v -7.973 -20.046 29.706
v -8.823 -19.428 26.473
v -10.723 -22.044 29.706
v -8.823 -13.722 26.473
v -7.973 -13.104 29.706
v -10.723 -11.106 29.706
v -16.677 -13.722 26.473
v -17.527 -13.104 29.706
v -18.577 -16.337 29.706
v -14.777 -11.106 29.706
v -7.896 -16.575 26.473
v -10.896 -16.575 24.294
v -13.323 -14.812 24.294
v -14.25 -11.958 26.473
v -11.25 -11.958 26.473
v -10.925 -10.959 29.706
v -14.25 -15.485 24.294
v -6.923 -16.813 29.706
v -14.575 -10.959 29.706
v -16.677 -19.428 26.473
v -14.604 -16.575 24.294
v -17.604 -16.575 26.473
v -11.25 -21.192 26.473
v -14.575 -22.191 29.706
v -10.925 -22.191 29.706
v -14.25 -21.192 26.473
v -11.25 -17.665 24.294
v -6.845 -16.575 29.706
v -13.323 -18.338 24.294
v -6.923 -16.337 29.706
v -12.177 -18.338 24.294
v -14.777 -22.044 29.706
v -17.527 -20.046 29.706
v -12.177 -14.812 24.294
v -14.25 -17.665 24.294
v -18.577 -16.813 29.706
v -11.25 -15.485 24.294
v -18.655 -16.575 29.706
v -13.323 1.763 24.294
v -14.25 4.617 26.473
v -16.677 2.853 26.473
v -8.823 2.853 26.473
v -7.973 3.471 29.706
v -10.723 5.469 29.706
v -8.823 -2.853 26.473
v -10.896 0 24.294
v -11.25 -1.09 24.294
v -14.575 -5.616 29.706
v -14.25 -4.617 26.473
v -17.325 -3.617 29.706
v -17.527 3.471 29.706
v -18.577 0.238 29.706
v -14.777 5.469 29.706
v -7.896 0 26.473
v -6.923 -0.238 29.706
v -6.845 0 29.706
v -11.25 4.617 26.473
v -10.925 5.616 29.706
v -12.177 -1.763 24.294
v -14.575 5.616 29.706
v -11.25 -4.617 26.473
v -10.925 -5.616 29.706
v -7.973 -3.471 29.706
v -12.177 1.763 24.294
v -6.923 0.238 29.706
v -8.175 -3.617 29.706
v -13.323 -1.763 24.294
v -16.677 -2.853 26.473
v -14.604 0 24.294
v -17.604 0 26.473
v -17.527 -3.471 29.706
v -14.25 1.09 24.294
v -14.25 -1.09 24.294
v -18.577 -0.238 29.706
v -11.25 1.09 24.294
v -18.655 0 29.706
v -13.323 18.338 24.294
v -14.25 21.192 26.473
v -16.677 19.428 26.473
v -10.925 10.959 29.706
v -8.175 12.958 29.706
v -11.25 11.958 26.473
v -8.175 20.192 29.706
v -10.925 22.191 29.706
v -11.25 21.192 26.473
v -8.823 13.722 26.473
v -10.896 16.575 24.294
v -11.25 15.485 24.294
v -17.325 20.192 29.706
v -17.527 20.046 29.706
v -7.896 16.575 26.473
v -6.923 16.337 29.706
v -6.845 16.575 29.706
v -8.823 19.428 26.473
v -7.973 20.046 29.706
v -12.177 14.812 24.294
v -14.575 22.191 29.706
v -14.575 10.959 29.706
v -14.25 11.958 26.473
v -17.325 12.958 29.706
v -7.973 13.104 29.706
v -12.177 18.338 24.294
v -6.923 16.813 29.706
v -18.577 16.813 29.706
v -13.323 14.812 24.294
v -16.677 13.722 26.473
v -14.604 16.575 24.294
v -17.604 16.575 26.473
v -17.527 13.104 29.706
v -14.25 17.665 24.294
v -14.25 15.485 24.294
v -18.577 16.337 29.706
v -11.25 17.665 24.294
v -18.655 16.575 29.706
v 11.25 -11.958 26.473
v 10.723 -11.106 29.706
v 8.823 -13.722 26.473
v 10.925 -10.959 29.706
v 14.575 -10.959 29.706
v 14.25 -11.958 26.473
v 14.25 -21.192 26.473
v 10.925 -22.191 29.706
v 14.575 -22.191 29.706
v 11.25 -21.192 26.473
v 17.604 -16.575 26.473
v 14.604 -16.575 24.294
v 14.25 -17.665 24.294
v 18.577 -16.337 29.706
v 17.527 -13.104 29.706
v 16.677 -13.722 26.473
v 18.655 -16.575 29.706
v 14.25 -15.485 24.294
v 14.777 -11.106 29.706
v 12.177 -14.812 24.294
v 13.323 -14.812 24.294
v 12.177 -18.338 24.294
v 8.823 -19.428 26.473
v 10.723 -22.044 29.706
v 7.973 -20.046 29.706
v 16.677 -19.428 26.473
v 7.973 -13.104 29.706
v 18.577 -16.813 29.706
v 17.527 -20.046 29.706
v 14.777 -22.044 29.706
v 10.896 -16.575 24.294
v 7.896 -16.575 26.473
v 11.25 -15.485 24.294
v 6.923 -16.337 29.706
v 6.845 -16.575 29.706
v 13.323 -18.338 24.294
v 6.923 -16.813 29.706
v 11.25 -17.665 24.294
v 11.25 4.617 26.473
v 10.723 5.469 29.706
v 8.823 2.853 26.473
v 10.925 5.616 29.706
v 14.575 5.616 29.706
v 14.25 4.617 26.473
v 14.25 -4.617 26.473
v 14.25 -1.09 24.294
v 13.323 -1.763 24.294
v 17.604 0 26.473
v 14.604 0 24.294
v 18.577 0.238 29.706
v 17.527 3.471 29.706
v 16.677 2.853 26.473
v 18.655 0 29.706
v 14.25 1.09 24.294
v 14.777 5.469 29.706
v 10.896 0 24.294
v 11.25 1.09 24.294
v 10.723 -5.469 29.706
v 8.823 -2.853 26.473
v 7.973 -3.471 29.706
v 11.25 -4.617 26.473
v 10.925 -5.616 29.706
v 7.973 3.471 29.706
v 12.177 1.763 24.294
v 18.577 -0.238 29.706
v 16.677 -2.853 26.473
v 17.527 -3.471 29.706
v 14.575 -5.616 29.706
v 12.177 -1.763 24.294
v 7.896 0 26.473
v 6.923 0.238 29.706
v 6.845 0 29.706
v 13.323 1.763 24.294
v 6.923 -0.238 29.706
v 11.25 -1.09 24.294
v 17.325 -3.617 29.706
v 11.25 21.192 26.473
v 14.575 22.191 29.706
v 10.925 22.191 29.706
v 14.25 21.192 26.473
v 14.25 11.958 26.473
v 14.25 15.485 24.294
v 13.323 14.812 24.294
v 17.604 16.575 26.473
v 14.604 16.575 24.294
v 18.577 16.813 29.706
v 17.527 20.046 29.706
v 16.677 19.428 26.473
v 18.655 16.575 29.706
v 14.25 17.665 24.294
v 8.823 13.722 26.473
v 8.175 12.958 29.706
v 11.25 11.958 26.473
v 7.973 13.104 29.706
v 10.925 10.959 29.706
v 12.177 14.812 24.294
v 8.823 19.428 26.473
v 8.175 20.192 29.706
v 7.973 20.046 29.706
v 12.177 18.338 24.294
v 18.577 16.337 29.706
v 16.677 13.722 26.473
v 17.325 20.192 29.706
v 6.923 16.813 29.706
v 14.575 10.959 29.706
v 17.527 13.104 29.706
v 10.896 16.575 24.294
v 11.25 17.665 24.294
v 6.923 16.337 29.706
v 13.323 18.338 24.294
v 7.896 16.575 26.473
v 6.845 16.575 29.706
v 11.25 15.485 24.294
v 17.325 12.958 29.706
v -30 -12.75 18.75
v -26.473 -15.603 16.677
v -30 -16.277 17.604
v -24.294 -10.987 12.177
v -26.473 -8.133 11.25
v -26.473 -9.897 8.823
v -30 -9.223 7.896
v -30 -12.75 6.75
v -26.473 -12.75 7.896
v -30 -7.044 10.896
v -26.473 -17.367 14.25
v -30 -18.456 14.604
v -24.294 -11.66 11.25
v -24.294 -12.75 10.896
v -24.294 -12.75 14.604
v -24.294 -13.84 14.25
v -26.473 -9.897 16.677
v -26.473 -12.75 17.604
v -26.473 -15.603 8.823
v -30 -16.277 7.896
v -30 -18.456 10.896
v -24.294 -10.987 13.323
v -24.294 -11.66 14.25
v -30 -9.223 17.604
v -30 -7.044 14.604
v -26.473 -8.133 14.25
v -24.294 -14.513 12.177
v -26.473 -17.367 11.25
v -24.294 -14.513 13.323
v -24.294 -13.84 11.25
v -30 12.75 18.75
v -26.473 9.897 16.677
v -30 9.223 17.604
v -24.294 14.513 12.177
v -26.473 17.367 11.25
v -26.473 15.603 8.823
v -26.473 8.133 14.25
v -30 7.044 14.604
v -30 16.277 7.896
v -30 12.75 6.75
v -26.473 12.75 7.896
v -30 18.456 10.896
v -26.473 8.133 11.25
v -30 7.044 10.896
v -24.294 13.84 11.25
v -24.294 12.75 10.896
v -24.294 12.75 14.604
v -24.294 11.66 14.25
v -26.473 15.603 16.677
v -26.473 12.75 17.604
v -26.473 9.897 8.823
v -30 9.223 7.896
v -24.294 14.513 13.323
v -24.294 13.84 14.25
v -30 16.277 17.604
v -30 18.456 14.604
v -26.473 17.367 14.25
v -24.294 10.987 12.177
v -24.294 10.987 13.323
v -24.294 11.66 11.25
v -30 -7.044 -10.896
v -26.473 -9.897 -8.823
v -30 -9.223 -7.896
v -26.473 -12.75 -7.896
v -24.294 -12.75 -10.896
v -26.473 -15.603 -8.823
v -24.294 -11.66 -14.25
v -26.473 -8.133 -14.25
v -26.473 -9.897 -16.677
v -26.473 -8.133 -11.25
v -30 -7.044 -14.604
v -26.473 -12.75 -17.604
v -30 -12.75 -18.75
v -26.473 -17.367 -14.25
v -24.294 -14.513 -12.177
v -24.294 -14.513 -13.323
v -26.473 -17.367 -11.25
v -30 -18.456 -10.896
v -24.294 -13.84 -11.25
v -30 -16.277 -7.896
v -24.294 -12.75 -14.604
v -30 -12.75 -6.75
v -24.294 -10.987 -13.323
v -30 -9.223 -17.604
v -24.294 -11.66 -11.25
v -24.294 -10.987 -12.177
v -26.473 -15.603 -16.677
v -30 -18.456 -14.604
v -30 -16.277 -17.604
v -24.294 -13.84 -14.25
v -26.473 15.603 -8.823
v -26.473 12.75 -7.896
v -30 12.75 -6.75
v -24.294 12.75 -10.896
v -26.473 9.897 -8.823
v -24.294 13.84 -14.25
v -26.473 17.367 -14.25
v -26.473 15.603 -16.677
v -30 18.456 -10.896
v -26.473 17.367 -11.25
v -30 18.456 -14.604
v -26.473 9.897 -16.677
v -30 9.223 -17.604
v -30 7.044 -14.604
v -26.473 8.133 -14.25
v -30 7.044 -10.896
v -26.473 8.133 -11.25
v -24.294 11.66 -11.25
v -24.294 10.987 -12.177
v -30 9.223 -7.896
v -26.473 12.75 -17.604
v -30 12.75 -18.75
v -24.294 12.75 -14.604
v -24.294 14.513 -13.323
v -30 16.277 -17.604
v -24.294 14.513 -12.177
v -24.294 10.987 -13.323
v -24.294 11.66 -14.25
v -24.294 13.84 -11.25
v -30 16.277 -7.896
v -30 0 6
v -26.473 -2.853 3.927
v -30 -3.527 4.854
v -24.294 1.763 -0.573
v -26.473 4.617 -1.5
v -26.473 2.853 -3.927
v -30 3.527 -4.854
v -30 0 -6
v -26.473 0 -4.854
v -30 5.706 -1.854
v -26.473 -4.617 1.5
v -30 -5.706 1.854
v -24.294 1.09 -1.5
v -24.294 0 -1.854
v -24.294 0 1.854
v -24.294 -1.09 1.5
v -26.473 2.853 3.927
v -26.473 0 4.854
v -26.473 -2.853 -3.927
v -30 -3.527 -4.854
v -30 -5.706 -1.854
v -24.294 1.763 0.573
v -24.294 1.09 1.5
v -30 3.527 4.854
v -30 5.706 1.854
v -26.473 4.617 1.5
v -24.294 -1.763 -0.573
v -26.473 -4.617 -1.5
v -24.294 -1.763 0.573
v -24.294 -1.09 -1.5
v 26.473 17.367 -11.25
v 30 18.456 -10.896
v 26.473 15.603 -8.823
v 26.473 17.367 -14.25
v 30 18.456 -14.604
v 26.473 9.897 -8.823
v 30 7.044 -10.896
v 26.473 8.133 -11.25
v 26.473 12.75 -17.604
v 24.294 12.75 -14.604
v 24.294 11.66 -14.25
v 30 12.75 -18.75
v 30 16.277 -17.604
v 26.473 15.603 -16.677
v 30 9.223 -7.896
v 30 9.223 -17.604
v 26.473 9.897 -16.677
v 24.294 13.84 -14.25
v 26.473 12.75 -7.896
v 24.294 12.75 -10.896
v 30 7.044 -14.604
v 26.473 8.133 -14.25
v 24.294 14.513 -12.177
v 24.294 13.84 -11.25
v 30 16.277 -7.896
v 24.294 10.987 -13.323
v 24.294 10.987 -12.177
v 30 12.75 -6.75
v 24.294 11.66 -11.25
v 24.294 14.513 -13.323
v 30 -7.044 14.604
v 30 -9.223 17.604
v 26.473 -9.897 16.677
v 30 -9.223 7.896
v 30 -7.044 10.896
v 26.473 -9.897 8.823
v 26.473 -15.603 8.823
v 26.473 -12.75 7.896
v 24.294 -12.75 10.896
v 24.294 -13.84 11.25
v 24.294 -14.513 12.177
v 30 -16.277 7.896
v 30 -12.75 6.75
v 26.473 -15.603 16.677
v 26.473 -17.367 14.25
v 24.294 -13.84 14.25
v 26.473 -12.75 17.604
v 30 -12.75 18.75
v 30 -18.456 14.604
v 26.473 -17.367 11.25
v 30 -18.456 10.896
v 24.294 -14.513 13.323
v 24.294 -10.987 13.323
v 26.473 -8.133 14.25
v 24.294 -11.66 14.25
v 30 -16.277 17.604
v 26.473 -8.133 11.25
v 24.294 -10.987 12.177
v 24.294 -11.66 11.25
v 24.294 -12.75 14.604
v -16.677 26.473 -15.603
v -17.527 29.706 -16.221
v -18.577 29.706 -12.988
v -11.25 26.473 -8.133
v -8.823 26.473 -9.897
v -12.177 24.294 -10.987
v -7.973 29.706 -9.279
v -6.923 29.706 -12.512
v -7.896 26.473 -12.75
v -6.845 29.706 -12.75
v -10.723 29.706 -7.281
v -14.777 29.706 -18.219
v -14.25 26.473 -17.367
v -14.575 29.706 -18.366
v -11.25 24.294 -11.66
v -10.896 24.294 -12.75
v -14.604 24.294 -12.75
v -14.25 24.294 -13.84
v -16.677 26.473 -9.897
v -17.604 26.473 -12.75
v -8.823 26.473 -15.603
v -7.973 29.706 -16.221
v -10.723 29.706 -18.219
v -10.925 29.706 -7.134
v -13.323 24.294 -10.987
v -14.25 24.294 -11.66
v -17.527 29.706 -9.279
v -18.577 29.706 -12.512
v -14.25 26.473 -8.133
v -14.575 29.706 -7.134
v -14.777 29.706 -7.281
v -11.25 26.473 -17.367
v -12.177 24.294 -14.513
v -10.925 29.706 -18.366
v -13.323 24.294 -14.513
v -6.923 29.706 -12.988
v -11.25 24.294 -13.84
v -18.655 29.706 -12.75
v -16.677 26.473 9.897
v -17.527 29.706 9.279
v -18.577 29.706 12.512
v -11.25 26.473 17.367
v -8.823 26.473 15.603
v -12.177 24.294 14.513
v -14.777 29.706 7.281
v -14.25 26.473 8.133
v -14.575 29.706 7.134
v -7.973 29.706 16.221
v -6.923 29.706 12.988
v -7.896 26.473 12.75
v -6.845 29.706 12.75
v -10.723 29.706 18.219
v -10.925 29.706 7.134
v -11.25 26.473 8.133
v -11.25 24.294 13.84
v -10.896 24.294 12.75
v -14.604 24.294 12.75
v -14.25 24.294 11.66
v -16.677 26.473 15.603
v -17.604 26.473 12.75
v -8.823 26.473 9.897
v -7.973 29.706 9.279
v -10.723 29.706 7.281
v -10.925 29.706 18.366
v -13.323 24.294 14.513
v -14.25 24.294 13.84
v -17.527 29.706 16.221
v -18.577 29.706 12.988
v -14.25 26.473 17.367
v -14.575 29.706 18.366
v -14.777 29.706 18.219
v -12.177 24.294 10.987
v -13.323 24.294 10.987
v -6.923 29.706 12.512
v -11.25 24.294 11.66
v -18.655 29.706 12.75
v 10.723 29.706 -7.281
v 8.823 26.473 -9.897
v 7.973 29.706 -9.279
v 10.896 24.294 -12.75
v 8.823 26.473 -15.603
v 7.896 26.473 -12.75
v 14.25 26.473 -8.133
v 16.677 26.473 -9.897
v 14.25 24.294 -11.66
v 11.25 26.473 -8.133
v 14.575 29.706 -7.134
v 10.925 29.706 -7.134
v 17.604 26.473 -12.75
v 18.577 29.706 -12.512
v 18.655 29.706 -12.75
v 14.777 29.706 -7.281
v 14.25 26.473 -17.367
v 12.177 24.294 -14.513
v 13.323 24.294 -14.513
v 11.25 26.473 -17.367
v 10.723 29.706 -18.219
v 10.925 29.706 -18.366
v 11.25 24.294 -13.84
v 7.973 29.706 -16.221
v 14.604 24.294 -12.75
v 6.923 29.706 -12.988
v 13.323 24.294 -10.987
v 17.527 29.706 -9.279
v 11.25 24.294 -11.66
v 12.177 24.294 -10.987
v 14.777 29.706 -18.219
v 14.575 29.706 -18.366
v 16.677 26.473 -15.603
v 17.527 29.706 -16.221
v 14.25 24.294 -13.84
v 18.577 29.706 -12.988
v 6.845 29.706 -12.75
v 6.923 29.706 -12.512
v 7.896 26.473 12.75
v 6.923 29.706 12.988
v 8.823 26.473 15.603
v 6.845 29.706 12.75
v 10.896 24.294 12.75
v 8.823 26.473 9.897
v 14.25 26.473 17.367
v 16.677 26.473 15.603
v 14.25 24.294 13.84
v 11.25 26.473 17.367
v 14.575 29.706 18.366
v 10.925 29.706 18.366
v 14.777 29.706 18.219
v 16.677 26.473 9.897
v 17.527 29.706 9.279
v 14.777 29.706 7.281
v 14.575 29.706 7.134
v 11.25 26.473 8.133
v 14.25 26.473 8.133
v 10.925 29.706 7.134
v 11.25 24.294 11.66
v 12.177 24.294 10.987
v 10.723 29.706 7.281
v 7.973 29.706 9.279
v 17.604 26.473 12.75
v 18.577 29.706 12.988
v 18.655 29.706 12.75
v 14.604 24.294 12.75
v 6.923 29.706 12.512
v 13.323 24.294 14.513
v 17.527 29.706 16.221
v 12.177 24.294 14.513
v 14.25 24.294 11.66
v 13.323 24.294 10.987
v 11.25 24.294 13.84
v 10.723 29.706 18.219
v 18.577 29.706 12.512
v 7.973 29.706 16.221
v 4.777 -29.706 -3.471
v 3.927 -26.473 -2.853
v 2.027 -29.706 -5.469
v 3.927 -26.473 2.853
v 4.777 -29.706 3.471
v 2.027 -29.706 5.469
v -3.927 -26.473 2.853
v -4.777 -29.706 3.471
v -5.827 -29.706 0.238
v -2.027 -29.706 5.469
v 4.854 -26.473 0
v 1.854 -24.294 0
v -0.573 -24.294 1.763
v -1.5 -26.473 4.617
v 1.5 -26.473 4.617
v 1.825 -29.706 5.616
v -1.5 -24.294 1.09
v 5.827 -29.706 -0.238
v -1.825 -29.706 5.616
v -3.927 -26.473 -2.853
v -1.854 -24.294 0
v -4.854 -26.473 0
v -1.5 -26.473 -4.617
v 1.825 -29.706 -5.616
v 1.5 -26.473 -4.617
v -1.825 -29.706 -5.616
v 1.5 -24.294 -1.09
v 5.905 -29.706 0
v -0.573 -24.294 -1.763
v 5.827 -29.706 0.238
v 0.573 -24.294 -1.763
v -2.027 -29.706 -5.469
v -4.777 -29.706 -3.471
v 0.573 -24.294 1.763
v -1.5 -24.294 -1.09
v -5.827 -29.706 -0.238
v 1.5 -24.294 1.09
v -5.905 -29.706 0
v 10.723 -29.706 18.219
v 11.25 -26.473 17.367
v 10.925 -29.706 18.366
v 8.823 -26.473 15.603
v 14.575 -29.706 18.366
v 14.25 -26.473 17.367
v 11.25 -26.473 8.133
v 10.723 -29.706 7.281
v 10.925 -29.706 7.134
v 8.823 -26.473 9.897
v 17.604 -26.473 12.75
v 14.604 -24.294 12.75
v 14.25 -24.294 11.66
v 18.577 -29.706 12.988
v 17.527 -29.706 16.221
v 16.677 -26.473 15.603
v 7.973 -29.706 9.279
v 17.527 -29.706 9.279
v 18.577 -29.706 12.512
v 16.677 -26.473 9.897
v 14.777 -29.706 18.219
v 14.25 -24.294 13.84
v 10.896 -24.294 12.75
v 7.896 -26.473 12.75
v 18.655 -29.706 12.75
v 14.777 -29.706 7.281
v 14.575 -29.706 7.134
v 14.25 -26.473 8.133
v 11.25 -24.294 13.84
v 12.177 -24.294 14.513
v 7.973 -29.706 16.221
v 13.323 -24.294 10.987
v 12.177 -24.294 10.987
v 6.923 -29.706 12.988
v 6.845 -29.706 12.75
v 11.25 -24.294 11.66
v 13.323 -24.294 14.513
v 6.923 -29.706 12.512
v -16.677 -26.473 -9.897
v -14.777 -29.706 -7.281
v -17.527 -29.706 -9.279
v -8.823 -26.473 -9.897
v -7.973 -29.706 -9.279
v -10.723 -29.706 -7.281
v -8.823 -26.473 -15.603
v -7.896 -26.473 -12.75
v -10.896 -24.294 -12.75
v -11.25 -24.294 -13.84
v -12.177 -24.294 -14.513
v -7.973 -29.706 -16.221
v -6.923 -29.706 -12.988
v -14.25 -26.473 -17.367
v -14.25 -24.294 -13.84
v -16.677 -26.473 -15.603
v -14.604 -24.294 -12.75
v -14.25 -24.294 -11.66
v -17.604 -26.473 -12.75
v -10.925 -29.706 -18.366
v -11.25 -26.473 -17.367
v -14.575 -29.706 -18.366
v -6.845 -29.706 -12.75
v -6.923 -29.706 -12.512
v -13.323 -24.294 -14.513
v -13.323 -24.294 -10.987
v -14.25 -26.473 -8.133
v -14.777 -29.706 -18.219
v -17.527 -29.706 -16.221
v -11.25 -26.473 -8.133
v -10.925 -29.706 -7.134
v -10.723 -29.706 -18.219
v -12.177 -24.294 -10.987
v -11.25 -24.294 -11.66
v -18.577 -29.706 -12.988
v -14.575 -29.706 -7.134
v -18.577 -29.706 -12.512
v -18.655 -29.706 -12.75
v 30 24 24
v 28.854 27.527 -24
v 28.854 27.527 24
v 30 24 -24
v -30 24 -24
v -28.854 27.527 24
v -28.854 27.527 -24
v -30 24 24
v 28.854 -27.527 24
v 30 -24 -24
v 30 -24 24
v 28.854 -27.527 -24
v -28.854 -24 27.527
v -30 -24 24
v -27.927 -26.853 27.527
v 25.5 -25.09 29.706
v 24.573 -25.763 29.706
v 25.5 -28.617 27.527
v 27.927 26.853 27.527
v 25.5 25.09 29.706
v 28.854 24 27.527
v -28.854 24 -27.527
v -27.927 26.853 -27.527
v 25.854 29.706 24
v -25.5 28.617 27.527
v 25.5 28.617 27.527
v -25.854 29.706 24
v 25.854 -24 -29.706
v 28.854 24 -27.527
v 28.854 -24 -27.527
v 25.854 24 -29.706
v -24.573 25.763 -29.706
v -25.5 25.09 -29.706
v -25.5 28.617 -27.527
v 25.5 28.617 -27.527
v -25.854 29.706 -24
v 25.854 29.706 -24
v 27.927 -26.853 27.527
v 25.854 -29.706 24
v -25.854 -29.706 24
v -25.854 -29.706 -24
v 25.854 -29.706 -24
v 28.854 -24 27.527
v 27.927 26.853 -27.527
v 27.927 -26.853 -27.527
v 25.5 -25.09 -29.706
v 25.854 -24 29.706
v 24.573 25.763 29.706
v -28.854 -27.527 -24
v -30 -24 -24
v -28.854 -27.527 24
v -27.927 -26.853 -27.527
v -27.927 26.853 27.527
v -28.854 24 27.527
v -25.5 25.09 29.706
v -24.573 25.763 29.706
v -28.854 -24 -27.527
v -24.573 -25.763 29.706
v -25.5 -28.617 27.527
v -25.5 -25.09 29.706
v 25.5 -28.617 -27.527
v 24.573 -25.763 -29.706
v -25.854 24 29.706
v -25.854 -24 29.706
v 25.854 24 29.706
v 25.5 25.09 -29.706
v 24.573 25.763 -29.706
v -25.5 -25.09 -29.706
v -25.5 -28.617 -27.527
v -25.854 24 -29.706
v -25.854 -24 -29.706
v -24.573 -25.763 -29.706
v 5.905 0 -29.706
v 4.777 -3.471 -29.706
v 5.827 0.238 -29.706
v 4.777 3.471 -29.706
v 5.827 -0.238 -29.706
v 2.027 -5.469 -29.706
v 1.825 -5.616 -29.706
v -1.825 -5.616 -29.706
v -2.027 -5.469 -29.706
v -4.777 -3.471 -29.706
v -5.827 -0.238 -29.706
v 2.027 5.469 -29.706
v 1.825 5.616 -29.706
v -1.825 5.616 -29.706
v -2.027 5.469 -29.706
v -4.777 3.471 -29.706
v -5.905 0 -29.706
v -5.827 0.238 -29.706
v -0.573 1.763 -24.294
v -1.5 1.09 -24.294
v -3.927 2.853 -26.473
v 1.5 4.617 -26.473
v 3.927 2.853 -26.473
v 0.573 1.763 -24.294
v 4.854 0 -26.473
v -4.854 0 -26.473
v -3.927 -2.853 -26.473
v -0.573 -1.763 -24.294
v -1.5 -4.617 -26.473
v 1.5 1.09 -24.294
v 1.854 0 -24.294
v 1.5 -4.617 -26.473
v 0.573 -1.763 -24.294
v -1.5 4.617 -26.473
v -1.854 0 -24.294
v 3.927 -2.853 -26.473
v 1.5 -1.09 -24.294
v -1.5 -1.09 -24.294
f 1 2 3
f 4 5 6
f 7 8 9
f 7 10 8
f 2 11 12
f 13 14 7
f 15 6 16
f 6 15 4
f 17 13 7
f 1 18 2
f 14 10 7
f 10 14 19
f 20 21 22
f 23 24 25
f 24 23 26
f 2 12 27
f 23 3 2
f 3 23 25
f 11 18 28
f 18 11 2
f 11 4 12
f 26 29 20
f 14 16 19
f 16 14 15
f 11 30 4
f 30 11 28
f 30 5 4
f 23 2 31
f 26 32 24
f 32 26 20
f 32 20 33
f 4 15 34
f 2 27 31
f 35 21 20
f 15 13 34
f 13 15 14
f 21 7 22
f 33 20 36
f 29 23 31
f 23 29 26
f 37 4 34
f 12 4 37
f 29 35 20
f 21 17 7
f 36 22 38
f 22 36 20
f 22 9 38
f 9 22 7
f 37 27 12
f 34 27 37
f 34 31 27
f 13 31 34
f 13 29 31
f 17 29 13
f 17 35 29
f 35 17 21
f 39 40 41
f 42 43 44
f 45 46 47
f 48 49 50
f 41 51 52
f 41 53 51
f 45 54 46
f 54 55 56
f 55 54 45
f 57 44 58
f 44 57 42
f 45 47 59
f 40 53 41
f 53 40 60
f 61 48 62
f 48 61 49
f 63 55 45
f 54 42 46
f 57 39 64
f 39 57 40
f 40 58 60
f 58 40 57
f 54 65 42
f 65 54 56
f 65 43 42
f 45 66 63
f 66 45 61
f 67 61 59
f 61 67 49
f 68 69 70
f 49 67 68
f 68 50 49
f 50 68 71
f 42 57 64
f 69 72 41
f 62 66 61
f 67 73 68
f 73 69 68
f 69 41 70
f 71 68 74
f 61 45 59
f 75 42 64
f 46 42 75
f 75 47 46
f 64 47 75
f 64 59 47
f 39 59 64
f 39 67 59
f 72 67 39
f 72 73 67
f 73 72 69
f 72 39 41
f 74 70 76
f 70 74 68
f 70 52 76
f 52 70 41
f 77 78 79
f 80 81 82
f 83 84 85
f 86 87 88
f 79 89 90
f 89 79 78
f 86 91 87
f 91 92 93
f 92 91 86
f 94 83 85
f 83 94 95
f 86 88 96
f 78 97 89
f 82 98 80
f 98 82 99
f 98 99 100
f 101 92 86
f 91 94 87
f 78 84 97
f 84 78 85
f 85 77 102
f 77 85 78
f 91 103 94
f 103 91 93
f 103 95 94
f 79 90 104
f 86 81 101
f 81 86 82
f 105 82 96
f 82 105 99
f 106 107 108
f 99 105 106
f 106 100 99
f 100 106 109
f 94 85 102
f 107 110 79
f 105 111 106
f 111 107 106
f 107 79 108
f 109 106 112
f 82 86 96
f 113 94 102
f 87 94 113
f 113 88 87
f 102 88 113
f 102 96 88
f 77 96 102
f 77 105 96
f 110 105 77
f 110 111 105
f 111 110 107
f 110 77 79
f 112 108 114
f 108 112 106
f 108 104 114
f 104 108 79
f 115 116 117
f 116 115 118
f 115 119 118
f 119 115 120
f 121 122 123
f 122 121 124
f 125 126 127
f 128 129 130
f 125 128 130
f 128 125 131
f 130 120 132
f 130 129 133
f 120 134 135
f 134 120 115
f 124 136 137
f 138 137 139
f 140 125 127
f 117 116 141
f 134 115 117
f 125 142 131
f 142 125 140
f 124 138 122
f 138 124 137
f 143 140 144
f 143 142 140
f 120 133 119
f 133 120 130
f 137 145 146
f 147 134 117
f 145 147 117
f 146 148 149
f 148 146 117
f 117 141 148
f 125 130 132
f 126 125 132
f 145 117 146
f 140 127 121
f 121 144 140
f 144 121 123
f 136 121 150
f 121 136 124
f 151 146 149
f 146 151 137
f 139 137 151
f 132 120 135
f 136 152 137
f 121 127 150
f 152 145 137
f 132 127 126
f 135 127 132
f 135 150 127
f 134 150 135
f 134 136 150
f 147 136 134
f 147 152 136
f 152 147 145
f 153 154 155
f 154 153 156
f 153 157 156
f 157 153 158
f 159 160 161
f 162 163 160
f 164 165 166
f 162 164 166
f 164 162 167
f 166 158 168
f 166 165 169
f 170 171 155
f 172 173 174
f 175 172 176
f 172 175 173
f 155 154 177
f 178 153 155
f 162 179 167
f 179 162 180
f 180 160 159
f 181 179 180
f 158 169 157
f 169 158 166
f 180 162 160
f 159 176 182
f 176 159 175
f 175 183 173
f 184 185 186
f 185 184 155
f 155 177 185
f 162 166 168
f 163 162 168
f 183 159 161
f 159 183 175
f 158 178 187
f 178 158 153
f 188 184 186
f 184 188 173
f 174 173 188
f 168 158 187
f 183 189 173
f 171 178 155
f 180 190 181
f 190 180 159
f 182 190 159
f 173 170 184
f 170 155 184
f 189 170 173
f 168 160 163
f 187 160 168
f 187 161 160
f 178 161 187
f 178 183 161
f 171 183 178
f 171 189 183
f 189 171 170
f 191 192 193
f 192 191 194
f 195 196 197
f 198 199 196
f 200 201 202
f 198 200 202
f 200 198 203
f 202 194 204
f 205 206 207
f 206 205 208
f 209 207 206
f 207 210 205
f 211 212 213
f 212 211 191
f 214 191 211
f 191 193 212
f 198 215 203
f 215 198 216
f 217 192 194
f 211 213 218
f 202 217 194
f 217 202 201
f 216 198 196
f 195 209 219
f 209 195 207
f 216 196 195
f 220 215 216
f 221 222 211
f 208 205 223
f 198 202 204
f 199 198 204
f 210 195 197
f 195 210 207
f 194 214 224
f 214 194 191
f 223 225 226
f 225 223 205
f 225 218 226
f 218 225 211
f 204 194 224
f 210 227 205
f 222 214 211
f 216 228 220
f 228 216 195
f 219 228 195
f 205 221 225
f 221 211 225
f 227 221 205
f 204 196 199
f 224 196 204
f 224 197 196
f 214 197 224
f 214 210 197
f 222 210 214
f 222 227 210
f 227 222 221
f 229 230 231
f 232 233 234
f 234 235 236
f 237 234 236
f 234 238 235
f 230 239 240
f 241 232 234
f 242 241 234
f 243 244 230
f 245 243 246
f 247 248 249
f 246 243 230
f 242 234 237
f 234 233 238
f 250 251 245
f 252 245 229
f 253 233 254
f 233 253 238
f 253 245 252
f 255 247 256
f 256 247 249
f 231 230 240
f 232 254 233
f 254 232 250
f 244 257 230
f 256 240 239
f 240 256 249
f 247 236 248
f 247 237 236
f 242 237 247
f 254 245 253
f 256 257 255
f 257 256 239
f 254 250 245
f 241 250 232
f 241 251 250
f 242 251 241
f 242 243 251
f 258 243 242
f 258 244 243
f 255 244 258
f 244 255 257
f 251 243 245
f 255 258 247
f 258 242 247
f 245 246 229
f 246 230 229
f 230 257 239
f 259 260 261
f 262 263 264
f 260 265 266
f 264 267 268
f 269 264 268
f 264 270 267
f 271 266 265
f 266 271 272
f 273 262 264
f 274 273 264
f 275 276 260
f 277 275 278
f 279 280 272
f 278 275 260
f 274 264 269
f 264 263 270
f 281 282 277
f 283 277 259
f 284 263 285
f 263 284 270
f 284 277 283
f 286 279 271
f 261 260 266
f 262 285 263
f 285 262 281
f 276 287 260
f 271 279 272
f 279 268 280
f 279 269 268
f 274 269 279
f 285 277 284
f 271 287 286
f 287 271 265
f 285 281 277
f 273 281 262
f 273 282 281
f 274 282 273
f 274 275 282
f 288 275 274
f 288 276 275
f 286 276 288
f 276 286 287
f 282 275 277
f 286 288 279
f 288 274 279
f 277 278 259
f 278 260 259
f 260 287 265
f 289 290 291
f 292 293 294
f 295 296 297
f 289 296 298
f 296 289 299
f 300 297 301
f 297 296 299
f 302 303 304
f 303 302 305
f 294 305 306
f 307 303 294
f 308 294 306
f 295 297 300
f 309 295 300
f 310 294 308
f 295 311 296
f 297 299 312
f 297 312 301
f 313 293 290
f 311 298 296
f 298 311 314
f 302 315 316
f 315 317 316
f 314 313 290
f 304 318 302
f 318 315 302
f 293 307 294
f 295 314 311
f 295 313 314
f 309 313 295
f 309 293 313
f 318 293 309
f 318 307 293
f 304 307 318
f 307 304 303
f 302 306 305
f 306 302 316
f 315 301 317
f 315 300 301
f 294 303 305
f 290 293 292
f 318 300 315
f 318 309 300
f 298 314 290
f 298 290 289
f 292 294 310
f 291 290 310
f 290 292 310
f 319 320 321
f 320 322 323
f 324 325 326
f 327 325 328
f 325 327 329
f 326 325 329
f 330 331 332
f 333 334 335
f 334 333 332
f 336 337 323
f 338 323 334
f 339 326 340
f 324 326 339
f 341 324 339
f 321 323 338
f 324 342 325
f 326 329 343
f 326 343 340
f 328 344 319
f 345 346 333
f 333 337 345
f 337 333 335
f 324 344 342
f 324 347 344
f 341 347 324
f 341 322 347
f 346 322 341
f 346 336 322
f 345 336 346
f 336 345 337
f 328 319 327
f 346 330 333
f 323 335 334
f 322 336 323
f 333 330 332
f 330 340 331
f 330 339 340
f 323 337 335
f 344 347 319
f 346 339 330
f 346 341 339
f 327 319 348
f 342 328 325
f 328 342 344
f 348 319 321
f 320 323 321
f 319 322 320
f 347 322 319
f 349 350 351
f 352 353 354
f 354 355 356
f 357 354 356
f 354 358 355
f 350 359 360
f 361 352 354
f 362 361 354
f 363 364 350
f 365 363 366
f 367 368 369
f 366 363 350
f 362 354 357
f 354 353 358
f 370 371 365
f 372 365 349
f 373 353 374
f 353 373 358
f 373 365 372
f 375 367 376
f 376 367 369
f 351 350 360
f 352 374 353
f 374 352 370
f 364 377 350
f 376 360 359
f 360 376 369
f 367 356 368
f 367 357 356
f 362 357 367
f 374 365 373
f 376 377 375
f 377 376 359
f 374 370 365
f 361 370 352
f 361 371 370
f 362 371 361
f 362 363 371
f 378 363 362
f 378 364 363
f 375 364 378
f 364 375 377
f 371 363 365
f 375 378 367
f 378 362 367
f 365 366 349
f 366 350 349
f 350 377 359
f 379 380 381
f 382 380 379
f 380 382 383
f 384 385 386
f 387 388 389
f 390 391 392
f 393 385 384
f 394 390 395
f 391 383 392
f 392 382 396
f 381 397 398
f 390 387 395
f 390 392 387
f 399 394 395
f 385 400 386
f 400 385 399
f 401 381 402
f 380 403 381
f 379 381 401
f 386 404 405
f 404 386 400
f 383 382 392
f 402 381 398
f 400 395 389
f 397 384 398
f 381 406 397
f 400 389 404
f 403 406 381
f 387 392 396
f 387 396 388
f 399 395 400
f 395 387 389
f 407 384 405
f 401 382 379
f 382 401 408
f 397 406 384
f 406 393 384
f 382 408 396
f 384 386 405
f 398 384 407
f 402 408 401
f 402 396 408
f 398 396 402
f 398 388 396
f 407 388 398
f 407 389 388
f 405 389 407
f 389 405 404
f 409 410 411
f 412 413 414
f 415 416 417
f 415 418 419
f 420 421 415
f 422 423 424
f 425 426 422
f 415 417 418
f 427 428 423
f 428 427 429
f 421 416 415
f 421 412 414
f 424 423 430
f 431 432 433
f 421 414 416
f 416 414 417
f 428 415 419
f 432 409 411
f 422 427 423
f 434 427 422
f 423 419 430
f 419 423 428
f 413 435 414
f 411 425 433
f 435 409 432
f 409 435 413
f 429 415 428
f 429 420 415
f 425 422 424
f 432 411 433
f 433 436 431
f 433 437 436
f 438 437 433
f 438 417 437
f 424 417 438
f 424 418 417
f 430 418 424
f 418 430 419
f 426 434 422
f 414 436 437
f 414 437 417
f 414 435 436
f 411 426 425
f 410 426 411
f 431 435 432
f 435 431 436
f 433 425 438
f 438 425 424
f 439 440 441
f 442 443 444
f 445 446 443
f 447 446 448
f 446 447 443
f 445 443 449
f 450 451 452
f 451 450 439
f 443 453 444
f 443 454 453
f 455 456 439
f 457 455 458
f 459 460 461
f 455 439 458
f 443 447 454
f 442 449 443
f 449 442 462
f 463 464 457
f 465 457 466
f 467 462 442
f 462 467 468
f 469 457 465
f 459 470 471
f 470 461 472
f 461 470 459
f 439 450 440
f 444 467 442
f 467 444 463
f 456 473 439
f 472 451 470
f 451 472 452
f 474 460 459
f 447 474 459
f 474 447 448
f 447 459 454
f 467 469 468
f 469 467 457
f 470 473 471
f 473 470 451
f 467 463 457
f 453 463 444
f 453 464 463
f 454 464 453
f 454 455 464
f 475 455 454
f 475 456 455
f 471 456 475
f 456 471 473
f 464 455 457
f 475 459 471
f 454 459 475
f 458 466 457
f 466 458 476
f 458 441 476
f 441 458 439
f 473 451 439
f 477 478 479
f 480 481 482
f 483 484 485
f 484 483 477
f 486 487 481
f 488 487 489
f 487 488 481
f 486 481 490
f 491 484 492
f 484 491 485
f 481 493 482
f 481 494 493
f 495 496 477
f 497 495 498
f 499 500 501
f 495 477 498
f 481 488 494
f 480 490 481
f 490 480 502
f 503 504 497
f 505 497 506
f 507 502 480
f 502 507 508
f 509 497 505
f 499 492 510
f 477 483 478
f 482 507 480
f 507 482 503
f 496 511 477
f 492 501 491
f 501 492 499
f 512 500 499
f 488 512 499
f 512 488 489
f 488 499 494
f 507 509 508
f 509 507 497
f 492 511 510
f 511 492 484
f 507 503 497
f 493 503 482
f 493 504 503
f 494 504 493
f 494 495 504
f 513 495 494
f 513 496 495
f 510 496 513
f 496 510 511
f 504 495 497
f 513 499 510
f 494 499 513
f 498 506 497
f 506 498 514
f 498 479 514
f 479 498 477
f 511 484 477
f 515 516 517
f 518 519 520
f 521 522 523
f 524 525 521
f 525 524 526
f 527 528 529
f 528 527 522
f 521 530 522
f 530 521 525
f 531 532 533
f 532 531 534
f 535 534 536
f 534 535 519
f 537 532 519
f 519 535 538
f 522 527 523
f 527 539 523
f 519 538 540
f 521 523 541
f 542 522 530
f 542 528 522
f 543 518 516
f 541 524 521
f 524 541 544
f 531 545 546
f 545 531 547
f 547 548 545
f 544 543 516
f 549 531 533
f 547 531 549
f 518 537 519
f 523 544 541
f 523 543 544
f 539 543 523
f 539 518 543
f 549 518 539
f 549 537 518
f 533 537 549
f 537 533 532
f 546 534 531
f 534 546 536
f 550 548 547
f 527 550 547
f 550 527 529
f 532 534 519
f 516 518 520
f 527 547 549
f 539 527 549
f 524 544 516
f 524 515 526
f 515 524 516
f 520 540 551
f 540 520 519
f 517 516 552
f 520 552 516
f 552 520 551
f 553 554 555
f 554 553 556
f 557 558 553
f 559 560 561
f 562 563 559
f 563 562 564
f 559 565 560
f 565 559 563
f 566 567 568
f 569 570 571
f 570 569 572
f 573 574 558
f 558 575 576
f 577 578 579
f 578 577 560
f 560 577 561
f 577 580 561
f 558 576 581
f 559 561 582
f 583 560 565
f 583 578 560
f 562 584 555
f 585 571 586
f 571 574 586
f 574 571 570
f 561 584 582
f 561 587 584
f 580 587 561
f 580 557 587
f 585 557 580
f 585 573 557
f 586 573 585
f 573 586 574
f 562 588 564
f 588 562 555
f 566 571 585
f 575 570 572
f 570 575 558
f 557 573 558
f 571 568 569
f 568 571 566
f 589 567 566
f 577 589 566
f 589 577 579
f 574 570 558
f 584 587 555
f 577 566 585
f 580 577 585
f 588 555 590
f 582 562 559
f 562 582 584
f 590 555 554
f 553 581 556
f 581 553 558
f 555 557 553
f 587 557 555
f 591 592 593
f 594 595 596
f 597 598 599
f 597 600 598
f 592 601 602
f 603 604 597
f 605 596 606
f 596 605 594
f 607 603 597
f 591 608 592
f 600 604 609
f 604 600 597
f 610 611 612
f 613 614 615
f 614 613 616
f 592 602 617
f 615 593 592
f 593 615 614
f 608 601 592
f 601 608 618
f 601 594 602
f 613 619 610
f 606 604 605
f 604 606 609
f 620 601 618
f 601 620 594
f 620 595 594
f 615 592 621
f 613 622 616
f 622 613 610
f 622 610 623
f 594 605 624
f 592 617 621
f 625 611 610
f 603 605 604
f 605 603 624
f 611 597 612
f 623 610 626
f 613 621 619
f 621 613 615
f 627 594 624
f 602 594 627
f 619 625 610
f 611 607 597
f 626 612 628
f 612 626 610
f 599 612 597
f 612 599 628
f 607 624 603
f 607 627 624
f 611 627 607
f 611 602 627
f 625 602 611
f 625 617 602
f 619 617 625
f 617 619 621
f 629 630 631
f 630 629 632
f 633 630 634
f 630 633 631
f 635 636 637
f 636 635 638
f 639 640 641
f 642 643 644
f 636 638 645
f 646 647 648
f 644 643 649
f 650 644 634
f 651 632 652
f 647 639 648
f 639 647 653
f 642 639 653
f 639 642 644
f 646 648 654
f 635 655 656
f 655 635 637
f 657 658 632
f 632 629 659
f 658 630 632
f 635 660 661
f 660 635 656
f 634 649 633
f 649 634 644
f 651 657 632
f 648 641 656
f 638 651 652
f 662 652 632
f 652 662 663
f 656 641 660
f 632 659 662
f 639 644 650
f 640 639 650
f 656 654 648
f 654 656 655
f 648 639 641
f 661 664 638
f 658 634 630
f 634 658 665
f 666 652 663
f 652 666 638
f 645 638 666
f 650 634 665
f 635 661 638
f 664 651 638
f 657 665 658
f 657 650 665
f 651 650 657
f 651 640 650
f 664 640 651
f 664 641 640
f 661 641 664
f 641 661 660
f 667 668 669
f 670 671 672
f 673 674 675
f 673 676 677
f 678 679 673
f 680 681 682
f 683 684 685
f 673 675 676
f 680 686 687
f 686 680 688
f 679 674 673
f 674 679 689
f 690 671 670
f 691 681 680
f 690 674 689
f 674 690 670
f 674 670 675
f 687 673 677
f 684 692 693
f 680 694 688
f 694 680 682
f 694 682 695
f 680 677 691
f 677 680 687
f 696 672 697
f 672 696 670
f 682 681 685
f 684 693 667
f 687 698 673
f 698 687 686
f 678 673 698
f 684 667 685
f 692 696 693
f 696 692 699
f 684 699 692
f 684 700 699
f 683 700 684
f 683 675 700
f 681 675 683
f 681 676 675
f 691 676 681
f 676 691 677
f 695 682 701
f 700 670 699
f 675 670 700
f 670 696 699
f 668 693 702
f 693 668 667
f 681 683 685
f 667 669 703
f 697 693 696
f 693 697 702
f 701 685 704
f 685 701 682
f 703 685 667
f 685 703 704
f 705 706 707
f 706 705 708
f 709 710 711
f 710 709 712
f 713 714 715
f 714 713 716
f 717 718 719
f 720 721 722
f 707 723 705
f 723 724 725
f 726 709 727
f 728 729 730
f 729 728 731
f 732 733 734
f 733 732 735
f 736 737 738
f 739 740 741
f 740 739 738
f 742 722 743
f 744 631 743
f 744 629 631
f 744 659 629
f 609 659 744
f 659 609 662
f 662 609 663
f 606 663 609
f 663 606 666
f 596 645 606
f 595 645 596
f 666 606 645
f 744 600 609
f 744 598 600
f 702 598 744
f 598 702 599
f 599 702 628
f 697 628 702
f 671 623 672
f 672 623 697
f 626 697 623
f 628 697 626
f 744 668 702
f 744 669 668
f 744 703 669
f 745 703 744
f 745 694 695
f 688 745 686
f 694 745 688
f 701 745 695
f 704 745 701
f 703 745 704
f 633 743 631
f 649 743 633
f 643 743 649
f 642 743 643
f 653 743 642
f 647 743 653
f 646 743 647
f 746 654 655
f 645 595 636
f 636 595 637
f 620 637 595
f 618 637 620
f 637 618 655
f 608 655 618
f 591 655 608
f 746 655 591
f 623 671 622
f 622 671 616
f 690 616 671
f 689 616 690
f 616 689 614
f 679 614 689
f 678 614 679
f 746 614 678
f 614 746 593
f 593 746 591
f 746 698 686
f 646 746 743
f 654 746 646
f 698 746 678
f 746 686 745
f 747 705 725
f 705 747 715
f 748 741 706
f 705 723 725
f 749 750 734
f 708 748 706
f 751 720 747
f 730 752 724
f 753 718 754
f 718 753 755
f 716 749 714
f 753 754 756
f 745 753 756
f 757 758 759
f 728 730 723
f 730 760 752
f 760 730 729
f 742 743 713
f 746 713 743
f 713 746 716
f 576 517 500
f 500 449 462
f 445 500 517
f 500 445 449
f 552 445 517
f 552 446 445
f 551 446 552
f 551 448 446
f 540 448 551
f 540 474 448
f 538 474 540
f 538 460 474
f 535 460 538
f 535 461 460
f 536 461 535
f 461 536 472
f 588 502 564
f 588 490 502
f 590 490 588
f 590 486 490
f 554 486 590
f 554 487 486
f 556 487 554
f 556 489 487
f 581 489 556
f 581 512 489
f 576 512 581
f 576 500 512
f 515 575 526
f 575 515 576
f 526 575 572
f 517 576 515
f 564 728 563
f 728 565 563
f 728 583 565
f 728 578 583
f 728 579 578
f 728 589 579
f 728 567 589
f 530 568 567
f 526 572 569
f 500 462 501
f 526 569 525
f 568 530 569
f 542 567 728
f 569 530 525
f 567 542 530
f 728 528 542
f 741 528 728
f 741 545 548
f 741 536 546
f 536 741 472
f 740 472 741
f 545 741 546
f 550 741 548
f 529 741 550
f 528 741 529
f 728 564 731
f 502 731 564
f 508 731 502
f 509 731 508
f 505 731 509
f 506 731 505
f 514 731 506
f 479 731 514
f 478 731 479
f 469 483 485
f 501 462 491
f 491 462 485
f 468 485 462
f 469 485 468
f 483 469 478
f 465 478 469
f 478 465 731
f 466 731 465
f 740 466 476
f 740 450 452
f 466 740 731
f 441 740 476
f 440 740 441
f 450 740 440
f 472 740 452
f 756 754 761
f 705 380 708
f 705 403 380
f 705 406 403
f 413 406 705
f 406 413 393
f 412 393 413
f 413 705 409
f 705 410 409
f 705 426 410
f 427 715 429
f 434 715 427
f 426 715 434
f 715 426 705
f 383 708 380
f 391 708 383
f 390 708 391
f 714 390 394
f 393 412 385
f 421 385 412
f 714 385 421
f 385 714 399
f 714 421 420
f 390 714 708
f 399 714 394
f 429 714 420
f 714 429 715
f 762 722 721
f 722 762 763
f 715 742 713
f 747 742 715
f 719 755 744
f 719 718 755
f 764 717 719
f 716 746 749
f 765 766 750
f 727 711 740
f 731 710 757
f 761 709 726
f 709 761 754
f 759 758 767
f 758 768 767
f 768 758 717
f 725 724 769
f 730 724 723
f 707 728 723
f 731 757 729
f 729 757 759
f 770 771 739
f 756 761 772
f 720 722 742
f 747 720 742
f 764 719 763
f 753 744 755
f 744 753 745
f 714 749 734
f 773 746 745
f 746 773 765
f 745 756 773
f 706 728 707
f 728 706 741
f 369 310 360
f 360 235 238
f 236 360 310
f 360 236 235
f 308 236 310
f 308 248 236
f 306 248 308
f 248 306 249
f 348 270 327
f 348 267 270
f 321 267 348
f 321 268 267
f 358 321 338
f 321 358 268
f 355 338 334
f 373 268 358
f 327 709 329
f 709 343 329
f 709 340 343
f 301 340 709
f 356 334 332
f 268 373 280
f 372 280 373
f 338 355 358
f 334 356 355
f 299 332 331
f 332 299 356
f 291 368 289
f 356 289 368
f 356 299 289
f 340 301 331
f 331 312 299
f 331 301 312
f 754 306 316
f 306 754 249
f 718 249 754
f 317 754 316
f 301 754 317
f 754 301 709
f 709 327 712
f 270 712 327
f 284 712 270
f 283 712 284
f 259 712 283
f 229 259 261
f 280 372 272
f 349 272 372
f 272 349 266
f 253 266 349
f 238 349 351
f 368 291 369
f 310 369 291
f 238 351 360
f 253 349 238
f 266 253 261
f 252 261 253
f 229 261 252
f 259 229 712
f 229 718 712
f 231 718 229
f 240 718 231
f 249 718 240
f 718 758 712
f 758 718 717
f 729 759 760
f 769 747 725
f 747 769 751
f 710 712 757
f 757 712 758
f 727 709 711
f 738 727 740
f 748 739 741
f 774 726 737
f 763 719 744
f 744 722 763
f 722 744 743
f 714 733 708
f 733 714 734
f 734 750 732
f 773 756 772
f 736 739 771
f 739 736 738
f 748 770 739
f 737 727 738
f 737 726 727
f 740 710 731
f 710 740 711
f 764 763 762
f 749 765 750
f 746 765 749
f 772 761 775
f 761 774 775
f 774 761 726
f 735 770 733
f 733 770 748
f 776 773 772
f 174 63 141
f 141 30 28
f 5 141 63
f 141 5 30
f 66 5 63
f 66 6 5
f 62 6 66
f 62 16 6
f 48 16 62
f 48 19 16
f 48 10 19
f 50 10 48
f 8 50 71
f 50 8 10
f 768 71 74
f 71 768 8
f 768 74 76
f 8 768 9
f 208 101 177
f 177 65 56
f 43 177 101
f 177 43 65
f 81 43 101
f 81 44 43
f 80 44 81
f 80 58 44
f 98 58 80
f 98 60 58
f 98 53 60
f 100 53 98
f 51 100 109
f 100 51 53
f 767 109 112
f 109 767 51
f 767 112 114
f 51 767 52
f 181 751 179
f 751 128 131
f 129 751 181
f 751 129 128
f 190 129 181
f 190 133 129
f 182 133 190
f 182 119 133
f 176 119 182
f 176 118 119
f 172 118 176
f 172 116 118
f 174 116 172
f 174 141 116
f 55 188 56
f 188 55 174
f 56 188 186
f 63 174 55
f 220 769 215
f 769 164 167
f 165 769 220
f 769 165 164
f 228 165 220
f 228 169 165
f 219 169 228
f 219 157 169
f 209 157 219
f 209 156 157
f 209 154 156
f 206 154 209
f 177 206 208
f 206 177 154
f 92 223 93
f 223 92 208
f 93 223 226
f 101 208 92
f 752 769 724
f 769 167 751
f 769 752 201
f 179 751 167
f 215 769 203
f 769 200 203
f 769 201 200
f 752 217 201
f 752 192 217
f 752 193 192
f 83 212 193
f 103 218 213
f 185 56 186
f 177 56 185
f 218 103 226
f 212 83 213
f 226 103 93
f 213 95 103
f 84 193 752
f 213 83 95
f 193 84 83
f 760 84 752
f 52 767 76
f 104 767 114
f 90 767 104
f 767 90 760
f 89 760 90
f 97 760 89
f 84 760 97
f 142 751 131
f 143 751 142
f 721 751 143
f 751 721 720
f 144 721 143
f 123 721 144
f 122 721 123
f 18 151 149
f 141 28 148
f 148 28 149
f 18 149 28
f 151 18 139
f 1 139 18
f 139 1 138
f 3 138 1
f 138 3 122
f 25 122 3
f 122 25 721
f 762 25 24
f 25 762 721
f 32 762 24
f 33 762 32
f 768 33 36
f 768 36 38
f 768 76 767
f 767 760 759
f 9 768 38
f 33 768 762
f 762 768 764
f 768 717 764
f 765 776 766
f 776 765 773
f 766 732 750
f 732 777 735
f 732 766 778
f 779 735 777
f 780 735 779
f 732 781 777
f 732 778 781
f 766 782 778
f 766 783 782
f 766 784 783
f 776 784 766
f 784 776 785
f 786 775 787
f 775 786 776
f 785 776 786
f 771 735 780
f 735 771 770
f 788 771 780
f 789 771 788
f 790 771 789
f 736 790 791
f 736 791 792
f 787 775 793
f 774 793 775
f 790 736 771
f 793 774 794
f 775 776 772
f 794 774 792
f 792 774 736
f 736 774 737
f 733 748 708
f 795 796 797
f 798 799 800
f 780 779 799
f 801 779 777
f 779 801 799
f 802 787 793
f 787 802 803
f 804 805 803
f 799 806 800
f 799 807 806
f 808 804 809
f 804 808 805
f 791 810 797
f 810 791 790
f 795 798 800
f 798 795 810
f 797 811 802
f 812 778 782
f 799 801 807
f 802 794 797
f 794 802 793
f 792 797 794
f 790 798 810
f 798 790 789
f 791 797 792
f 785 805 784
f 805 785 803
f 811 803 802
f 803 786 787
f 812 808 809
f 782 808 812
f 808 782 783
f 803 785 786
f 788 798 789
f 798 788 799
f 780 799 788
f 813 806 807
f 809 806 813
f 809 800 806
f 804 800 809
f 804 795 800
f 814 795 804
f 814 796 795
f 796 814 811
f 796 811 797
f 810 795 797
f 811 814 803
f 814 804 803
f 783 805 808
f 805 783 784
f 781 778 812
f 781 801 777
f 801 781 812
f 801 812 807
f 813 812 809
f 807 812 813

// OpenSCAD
side=30; //ребро куба//side size
global_one=side;//глобально//global,dont tuch,please

d_hull=global_one/2.5; //радиус фасок//chamfer rounding
fn_hull=10; //гладкость фасок//chamfer smoothness
dotd=global_one/2.5; //диаметр точек//diameter of points
dots_fn=10; //гладкость точек//smooth points


xx=0.85*global_one;
yy=0.65*xx;

module cubel (){
    hull(){
for (x=[0:1:1]){
    for (y=[0:1:1]){
        for (z=[0:1:1]){
translate ([pow(-1,x)*(side-d_hull/2), pow(-1,y)*(side-d_hull/2),pow(-1,z)*(side-d_hull/2)])
sphere (d=d_hull,$fn=fn_hull);
            
                        }
                    }
                }
} 
}


module six(xx,yy) {
    translate ([-xx/2,-yy])
    for (a=[0:1:1]){
    for (b=[0:1:2]){
        translate ([a*xx,b*yy,0])
        sphere (d=dotd,$fn=dots_fn,center=true);
        }
    }
}

module four(xx) {
    
    translate ([-xx/2,-xx/2,0])
    for (a=[0:1:1]){
    for (b=[0:1:1]){
        translate ([a*xx,b*xx,0])
        sphere (d=dotd,$fn=dots_fn,center=true);
    }}
    }
module five(xx) {
     translate ([-xx/2,-xx/2,0])
    for (a=[0:1:1]){
    for (b=[0:1:1]){
        translate ([a*xx,b*xx,0])
        sphere (d=dotd,$fn=dots_fn,center=true);
    }
    }
    
    sphere (d=dotd,$fn=dots_fn,center=true);
    }
module two (xx){
    union () {
translate ([xx/2,xx/2,0])
    sphere (d=dotd,$fn=dots_fn,center=true);
    
translate ([-xx/2,-xx/2,0])
    sphere (d=dotd,$fn=dots_fn,center=true);
    }
    
}


module one() {
sphere (d=dotd,$fn=dots_fn,center=true);
}
module three (xx) {
    
    union () {
        
        sphere (d=dotd,$fn=dots_fn,center=true);
        
translate ([xx/2,xx/2,0])
    sphere (d=dotd,$fn=10,center=true);
    
translate ([-xx/2,-xx/2,0])
    sphere (d=dotd,$fn=dots_fn,center=true);
    }
}



difference(){

cubel ();
    
translate ([0,0,-side])
one();

translate ([0,0,side]) 
six(xx,yy);

translate ([-side,0,0])
rotate ([0,90,0])
five(xx);
    
translate ([side,0,0])
rotate ([0,90,0])
two(xx);

translate ([0,side,0])
rotate ([90,0,0])
four(xx);

translate ([0,-side,0])
rotate ([90,0,0])
three(xx);
  }  
//one();   
//two(10);   
//three(xx=10);
//four(xx=10);
//five(xx=10);    
//six(xx=10,yy=5);
